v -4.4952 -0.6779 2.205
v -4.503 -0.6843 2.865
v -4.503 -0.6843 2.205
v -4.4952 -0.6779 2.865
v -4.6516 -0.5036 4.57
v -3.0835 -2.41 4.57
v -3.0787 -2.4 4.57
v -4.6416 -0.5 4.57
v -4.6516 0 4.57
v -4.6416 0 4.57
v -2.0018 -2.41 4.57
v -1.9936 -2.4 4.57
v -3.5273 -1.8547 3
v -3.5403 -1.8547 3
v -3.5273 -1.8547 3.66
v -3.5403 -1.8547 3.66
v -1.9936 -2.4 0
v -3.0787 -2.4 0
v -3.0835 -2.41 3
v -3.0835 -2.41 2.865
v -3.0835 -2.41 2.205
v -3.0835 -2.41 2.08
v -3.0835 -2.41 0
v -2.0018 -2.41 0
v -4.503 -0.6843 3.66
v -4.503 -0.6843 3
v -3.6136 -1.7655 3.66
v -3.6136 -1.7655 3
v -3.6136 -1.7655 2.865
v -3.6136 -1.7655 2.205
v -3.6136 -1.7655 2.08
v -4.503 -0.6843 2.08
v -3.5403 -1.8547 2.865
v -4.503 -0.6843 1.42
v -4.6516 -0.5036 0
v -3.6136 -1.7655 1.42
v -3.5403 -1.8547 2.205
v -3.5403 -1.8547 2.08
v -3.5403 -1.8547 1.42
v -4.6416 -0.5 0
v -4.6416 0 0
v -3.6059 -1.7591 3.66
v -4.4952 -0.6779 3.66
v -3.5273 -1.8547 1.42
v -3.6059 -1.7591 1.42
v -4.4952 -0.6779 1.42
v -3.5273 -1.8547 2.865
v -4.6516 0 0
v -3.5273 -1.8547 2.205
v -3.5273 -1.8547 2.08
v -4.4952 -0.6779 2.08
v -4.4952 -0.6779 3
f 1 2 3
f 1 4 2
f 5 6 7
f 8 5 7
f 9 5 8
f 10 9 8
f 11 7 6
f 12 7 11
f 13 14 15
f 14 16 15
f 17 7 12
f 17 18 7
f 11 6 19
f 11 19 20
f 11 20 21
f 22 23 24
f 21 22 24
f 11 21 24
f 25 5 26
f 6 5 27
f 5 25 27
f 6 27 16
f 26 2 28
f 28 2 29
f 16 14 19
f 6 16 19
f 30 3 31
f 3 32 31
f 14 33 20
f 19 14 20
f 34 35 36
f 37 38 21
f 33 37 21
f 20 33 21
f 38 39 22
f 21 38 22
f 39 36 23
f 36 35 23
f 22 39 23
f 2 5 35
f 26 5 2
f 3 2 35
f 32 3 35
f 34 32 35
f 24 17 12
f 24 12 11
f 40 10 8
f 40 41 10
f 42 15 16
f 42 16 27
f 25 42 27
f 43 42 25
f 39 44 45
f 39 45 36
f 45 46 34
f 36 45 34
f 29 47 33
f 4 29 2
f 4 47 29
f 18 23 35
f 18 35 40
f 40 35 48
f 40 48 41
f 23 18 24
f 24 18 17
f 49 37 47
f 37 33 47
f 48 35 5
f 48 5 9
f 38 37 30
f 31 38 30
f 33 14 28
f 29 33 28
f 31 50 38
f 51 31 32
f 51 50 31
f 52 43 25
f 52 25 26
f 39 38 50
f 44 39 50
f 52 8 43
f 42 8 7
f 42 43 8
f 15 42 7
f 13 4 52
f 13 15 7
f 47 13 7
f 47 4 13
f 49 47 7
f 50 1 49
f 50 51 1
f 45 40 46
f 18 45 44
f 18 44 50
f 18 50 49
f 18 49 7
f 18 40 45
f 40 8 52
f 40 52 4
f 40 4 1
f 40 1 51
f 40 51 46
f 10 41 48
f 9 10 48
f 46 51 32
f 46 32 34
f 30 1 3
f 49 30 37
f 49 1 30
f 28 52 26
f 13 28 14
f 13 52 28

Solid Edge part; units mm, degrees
sketch "Sketch1" plane through (0, 0, 0) normal (0, 0, 1) x (1, 0, 0)
  line L0 (-4.651602, -0.503584) -> (-3.083454, -2.41)
  line L1 (-3.083454, -2.41) -> (-2.001801, -2.41)
  line L2 (-1.993575, -2.4) -> (-2.001801, -2.41)
  line L3 (-3.078731, -2.4) -> (-1.993575, -2.4)
  line L4 (-4.641602, -0.5) -> (-3.078731, -2.4)
  line L5 (-4.641602, 0) -> (-4.641602, -0.5)
  line L6 (-4.641602, 0) -> (-4.651602, 0)
  line L7 (-4.651602, -0.503584) -> (-4.651602, 0)
  dimension "D1" = 4.641602
extrude "Protrusion1" add sketch "Sketch1" along normal blind 4.57
sketch "Sketch2" plane through (-3.901295, -1.4, 2.325) normal (0.7722962, 0.6352626, 0) x (0, 0, 1)
  line L0 (1.335, 0.465028) -> (1.335, -0.934972)
  line L1 (1.335, -0.934972) -> (0.675, -0.934972)
  line L2 (0.675, -0.934972) -> (0.675, 0.465028)
  line L3 (0.675, 0.465028) -> (1.335, 0.465028)
  line L4 (-0.12, 0.465028) -> (0.54, 0.465028)
  line L5 (0.54, 0.465028) -> (0.54, -0.934972)
  line L6 (0.54, -0.934972) -> (-0.12, -0.934972)
  line L7 (-0.12, -0.934972) -> (-0.12, 0.465028)
  line L8 (-0.905, 0.465028) -> (-0.245, 0.465028)
  line L9 (-0.245, 0.465028) -> (-0.245, -0.934972)
  line L10 (-0.245, -0.934972) -> (-0.905, -0.934972)
  line L11 (-0.905, -0.934972) -> (-0.905, 0.465028)
extrude "Cutout1" cut sketch "Sketch2" against normal through all
sketch "Sketch3" plane through (-4.054426, -1.221708, 3.66) normal (0, 0, -1) x (-0.6352626, 0.7722962, 0)
  line L0 (-0.7, -0.005) -> (-0.7, 0.005)
  line L1 (-0.823677, 0.005) -> (-0.7, 0.005)
  line L2 (-0.815451, -0.005) -> (-0.823677, 0.005)
  line L3 (-0.7, -0.005) -> (-0.815451, -0.005)
extrude "Cutout2" cut sketch "Sketch3" along normal up to surface (2.24 mm away)
sketch "Sketch4" plane through (-3.860167, -1.45, 2.285) normal (0.7722962, 0.6352626, 0) x (0, 0, 1)
  line L0 (0.715, -0.999714) -> (0.715, 1.234821)
  line L1 (0.715, 1.234821) -> (0.58, 1.234821)
  line L2 (0.58, 1.234821) -> (0.58, -0.999714)
  line L3 (0.715, -0.999714) -> (0.58, -0.999714)
  line L4 (-0.08, -0.999714) -> (-0.08, 1.234821)
  line L5 (-0.08, 1.234821) -> (-0.205, 1.234821)
  line L6 (-0.205, 1.234821) -> (-0.205, -0.999714)
  line L7 (-0.08, -0.999714) -> (-0.205, -0.999714)
extrude "Protrusion2" add sketch "Sketch4" against normal up to surface (0.01 mm away)
